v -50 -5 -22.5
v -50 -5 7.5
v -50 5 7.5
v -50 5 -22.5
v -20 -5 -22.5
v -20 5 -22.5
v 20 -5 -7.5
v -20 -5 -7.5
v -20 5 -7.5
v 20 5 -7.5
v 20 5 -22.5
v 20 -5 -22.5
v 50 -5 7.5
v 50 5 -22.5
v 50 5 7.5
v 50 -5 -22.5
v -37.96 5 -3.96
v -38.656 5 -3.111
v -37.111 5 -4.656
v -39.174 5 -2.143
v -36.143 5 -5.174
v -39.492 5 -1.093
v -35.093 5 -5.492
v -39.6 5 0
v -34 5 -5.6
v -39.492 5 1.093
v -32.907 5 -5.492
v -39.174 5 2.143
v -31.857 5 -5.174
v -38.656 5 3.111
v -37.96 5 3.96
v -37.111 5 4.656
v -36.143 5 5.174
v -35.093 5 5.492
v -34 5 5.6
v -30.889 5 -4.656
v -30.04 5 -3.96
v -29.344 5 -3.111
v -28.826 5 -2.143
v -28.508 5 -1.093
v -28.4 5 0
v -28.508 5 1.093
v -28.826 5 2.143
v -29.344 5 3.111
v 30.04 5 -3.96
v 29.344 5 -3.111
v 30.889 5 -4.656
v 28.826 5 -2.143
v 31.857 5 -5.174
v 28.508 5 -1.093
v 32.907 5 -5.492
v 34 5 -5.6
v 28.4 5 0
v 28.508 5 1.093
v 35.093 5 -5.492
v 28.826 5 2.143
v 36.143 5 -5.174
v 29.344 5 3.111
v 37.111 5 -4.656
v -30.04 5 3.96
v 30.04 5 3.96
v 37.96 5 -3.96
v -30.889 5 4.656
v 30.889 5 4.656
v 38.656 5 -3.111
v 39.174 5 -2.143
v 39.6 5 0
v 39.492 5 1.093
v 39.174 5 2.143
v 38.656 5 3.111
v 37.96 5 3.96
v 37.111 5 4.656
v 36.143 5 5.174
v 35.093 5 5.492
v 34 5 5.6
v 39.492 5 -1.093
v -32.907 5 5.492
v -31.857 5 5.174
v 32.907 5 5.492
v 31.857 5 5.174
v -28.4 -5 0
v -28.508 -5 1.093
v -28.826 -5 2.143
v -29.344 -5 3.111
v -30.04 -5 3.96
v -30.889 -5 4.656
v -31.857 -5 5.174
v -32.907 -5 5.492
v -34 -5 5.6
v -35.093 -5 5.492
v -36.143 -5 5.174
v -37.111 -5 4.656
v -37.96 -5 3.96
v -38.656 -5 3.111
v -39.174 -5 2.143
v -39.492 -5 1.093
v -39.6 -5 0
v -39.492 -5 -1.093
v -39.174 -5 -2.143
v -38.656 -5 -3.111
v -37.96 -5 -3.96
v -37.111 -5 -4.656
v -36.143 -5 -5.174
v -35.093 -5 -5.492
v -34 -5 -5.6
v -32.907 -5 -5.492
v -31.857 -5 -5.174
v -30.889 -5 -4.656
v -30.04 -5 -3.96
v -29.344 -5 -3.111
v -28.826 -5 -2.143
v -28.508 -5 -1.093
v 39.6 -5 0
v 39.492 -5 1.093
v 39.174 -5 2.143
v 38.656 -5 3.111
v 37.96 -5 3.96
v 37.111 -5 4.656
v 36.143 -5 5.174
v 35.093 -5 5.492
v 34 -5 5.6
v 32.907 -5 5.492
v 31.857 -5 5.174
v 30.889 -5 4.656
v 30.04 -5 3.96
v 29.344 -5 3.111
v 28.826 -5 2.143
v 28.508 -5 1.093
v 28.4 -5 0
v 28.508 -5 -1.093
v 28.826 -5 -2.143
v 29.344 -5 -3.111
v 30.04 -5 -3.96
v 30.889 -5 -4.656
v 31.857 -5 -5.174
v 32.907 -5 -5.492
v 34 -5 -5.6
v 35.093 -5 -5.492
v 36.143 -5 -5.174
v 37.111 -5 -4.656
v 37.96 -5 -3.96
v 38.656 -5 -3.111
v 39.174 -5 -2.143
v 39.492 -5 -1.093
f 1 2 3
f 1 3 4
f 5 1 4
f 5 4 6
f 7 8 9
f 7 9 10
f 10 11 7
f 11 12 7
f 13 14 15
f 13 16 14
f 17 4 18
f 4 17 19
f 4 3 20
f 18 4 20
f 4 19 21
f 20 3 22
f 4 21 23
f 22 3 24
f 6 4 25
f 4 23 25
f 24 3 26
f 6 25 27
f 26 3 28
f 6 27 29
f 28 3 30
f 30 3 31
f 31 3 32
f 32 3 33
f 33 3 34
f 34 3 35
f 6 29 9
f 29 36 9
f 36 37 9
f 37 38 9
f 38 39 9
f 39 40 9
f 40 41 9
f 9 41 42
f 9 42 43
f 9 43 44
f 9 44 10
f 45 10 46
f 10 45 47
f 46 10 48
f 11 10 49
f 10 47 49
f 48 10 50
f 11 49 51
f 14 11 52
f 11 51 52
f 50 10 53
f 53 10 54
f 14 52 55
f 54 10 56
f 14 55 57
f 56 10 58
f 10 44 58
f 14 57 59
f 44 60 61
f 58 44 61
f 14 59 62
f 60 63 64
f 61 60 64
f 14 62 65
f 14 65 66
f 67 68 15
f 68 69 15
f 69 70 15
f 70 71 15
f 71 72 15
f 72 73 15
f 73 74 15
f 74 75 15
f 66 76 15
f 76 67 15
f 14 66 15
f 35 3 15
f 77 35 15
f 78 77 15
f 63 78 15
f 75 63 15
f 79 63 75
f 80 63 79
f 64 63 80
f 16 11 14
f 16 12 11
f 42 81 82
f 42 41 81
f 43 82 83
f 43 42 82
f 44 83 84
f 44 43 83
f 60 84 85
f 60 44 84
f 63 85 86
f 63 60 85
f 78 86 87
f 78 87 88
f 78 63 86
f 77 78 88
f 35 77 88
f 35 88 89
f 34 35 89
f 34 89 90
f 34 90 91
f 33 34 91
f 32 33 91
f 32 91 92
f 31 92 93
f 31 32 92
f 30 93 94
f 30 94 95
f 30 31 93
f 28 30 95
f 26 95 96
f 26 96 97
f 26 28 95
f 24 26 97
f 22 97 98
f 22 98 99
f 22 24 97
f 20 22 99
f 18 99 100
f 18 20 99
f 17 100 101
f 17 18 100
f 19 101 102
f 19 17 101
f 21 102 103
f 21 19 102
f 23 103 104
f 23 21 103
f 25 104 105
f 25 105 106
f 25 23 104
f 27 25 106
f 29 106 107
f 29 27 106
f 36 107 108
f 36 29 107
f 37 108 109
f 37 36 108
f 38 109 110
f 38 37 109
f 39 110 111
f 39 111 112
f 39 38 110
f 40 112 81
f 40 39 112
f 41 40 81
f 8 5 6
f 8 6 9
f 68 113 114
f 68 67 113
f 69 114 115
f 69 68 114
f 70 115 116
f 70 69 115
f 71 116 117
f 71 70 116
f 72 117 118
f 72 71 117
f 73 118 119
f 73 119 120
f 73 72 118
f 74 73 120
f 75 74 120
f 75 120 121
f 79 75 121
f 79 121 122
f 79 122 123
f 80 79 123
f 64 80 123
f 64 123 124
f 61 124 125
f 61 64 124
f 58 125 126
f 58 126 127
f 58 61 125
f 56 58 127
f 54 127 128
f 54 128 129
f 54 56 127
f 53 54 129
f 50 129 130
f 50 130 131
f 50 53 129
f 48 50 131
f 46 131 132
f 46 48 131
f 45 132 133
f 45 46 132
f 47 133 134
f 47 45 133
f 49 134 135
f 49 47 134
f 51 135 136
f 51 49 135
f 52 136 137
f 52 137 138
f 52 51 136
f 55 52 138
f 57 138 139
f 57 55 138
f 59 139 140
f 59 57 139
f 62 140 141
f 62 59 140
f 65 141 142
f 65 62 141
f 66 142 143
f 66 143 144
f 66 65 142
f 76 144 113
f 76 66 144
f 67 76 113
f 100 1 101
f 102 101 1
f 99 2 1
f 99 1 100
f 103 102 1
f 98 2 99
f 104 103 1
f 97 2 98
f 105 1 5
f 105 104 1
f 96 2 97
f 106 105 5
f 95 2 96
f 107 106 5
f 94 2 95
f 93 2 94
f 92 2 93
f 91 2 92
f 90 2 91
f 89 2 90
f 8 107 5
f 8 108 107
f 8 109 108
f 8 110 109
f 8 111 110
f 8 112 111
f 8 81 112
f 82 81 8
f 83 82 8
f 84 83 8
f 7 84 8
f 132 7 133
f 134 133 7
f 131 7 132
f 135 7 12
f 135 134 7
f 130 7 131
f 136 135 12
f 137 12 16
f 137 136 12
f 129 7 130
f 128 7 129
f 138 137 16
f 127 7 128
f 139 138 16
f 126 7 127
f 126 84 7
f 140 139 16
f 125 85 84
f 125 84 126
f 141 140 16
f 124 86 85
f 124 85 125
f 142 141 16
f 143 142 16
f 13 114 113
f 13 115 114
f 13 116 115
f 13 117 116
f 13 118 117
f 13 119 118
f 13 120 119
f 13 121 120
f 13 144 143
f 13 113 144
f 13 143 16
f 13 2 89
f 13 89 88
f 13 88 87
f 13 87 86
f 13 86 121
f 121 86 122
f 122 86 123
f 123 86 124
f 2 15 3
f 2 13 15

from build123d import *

# Parameters (mm, degrees)
F0_R     = 5.6
F0_W     = 30
F0_H     = 15
F1_DEPTH = 5


with BuildPart() as f1:
    # F0 (on Front) → F1 (new body, symmetric)
    with BuildSketch(Plane.XZ):
        Polygon((50, 7.5), (-50, 7.5), (-50, -7.5), (-20, -7.5), (20, -7.5), (50, -7.5), align=None)
        with Locations((-34, 0)):
            Circle(F0_R, mode=Mode.SUBTRACT)
        with Locations((34, 0)):
            Circle(F0_R, mode=Mode.SUBTRACT)
        with Locations((-35, -15)):
            Rectangle(F0_W, F0_H)
        with Locations((35, -15)):
            Rectangle(F0_W, F0_H)
    extrude(amount=F1_DEPTH, both=True)


solid = f1.part
